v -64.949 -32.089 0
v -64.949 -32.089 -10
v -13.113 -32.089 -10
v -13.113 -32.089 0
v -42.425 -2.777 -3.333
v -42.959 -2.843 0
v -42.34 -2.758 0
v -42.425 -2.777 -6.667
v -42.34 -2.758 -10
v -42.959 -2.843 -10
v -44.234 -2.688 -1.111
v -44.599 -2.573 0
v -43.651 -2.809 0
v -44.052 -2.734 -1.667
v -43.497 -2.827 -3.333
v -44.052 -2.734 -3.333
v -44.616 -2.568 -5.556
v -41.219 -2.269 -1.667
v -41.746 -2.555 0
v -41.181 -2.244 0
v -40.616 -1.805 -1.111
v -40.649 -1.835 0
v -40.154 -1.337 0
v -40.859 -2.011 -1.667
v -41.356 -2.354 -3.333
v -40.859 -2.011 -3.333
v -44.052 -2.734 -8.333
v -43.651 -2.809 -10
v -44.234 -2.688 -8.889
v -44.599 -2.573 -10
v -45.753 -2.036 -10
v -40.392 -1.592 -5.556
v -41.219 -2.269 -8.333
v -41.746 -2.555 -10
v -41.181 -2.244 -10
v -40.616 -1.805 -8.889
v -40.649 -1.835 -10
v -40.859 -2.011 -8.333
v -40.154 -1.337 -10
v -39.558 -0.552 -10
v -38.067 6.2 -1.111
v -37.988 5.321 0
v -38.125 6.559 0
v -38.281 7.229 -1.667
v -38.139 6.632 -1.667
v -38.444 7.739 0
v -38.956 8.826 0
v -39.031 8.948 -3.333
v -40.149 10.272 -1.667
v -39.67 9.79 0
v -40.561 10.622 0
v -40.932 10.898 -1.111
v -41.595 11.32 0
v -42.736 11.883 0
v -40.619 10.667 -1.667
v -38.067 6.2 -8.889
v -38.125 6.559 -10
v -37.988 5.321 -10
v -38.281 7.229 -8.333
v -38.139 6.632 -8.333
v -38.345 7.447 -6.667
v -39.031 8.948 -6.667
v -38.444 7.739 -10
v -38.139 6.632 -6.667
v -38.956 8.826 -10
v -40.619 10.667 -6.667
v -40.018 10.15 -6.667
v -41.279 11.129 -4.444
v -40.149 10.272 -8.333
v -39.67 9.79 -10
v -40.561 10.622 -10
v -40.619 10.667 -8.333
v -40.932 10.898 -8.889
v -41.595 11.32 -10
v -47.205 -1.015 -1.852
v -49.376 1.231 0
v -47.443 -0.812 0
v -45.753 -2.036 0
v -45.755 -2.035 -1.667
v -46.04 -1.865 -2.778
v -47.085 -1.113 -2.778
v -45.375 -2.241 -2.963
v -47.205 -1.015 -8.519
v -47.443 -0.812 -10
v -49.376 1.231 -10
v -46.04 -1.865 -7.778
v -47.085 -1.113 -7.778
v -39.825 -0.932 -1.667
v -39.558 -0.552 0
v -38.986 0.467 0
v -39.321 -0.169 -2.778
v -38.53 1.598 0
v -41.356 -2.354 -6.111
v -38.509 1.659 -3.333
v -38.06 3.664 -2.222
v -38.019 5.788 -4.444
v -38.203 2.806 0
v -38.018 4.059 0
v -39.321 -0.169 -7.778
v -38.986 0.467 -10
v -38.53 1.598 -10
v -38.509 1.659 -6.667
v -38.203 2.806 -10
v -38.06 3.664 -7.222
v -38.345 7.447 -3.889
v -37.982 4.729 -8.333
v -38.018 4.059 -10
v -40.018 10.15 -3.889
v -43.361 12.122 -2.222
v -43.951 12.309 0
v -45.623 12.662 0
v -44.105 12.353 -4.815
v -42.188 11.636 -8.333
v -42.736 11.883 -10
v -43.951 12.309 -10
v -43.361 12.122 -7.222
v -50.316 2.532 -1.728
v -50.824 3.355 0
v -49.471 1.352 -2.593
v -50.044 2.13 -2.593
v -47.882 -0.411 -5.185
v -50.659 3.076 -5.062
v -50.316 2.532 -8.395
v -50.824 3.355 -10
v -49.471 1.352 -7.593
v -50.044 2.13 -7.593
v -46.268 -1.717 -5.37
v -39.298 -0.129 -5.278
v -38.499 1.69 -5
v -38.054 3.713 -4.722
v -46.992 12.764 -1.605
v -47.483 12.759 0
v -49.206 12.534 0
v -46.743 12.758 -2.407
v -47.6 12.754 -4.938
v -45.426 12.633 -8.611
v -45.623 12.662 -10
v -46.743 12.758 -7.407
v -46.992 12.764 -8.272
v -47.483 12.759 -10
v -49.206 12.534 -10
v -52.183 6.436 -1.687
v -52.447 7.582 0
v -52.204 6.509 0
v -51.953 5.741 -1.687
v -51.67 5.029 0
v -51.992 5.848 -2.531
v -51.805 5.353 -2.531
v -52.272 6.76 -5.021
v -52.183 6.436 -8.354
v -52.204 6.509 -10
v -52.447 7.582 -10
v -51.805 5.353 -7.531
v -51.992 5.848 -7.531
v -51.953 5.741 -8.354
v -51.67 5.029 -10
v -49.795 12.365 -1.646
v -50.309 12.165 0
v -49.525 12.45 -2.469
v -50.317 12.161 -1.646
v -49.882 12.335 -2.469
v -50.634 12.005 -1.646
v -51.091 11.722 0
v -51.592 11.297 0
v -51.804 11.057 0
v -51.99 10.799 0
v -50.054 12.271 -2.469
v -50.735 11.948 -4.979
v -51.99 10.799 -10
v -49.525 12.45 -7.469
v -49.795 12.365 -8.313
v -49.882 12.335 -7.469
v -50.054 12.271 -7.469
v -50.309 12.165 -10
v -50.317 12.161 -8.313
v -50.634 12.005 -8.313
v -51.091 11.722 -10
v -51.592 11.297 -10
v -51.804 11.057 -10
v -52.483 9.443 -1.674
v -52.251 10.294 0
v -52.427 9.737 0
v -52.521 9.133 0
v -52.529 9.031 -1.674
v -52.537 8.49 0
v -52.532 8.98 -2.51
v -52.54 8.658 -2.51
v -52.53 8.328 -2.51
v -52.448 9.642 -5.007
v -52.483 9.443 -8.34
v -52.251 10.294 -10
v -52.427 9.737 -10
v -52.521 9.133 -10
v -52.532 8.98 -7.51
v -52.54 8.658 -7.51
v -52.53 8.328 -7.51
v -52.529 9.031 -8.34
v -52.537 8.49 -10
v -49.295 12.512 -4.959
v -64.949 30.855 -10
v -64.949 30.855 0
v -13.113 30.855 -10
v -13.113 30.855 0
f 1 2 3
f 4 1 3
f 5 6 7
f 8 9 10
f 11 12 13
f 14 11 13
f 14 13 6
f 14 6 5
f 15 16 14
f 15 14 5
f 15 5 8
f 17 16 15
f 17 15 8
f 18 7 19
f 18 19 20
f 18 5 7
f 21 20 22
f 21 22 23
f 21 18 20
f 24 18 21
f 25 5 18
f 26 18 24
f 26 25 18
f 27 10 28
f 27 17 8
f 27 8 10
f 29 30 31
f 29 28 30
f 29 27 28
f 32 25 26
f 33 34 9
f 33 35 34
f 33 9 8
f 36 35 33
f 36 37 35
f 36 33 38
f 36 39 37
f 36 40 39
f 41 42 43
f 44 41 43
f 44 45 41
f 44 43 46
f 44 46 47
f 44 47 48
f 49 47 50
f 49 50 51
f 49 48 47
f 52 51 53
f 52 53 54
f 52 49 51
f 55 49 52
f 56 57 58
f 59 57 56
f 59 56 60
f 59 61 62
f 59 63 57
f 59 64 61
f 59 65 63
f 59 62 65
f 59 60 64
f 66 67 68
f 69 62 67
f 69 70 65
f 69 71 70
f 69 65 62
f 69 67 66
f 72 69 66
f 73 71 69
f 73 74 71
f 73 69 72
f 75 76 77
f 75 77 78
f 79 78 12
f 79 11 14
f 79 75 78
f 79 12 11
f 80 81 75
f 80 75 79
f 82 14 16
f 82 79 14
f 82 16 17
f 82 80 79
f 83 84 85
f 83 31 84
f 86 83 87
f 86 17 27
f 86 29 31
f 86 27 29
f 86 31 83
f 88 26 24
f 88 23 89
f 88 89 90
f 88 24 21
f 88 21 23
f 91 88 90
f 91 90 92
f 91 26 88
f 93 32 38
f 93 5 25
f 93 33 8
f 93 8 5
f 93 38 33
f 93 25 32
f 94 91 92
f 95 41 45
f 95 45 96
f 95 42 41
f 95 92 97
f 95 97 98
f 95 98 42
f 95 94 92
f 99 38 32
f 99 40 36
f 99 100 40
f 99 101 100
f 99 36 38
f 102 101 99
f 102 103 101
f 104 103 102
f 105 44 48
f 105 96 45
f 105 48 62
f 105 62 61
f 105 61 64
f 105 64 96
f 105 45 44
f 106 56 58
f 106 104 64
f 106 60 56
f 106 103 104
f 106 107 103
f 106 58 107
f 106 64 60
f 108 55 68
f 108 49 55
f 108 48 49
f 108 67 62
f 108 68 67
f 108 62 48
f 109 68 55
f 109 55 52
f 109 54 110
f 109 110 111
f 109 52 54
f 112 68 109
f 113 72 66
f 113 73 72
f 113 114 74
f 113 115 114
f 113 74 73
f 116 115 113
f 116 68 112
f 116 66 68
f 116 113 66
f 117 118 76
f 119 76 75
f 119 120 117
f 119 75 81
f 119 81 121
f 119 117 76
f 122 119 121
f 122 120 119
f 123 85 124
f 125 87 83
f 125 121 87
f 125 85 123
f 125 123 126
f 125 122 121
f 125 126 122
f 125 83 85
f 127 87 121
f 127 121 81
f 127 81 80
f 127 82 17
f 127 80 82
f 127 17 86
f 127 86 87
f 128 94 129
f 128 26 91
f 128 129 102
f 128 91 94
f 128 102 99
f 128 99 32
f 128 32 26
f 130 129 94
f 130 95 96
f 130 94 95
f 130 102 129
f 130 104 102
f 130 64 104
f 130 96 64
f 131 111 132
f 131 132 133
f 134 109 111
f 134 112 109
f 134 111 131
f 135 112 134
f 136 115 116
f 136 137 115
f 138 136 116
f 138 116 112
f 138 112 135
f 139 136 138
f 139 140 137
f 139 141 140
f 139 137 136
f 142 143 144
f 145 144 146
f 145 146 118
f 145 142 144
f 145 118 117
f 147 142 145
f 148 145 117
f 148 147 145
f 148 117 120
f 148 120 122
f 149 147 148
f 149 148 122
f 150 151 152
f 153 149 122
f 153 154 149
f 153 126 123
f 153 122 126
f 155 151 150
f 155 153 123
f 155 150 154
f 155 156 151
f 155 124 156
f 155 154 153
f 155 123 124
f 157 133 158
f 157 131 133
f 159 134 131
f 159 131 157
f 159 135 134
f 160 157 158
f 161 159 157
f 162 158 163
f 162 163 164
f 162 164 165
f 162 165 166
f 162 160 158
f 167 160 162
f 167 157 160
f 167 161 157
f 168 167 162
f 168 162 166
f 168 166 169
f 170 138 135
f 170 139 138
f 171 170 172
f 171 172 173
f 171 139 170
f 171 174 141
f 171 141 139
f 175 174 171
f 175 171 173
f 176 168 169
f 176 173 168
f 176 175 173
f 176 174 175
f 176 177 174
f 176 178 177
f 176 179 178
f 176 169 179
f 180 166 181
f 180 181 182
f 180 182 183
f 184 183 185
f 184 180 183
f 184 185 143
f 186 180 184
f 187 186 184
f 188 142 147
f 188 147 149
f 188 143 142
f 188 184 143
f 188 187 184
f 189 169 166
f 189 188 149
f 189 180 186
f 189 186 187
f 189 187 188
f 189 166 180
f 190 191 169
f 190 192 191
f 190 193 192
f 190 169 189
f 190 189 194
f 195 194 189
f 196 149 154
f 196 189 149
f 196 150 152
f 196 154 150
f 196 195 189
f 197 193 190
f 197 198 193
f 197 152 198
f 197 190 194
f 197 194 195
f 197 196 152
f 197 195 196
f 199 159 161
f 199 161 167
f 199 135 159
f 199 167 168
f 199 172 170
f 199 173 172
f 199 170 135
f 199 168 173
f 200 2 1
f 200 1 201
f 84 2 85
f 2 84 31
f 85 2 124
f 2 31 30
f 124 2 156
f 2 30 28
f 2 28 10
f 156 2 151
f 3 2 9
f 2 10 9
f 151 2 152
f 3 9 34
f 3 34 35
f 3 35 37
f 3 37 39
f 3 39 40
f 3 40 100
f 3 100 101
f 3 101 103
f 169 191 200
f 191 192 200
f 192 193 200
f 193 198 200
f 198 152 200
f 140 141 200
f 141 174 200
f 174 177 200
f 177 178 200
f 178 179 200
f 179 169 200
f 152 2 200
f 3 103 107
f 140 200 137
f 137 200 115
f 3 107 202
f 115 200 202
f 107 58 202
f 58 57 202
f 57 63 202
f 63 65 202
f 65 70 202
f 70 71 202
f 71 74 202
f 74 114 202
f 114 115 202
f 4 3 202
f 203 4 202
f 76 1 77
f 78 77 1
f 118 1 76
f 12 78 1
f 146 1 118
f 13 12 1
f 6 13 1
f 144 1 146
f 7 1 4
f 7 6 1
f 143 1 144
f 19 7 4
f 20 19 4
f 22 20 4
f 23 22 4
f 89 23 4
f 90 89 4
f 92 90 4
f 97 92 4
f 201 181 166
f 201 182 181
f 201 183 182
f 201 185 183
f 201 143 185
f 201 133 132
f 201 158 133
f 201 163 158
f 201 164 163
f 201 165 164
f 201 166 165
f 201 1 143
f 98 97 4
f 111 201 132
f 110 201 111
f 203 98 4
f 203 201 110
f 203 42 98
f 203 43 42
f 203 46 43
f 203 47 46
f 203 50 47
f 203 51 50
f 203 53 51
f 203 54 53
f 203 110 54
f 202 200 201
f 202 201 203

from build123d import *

# Parameters (mm, degrees)
THICKEN_START       = -10
THICKEN_1_OUTLINE_W = 51.835740335
THICKEN_1_OUTLINE_H = 62.943398979
THICKEN_1_DEPTH     = 10


# Read off the part's stored shape, not the designer's step: Придать толщину1
with BuildPart() as part:
    # Придать толщину1 outline → Придать толщину1 (new body)
    with BuildSketch(Plane.XY.offset(THICKEN_START)):
        with Locations((-39.031078289, -0.617092147)):
            Rectangle(THICKEN_1_OUTLINE_W, THICKEN_1_OUTLINE_H)
        with BuildLine():
            add(Edge.make_bspline(
                [(-51.990013372, 10.79911257), (-54.604406091, 6.724584095), (-41.961423525, -11.538827577), (-34.058339356, 12.470514149), (-49.929227681, 14.010845038), (-51.990013372, 10.79911257)],
                knots=[0, 0, 0, 0, 0.396316014, 0.687605322, 1, 1, 1, 1], degree=3))
        make_face(mode=Mode.SUBTRACT)
    extrude(amount=THICKEN_1_DEPTH)


solid = part.part
